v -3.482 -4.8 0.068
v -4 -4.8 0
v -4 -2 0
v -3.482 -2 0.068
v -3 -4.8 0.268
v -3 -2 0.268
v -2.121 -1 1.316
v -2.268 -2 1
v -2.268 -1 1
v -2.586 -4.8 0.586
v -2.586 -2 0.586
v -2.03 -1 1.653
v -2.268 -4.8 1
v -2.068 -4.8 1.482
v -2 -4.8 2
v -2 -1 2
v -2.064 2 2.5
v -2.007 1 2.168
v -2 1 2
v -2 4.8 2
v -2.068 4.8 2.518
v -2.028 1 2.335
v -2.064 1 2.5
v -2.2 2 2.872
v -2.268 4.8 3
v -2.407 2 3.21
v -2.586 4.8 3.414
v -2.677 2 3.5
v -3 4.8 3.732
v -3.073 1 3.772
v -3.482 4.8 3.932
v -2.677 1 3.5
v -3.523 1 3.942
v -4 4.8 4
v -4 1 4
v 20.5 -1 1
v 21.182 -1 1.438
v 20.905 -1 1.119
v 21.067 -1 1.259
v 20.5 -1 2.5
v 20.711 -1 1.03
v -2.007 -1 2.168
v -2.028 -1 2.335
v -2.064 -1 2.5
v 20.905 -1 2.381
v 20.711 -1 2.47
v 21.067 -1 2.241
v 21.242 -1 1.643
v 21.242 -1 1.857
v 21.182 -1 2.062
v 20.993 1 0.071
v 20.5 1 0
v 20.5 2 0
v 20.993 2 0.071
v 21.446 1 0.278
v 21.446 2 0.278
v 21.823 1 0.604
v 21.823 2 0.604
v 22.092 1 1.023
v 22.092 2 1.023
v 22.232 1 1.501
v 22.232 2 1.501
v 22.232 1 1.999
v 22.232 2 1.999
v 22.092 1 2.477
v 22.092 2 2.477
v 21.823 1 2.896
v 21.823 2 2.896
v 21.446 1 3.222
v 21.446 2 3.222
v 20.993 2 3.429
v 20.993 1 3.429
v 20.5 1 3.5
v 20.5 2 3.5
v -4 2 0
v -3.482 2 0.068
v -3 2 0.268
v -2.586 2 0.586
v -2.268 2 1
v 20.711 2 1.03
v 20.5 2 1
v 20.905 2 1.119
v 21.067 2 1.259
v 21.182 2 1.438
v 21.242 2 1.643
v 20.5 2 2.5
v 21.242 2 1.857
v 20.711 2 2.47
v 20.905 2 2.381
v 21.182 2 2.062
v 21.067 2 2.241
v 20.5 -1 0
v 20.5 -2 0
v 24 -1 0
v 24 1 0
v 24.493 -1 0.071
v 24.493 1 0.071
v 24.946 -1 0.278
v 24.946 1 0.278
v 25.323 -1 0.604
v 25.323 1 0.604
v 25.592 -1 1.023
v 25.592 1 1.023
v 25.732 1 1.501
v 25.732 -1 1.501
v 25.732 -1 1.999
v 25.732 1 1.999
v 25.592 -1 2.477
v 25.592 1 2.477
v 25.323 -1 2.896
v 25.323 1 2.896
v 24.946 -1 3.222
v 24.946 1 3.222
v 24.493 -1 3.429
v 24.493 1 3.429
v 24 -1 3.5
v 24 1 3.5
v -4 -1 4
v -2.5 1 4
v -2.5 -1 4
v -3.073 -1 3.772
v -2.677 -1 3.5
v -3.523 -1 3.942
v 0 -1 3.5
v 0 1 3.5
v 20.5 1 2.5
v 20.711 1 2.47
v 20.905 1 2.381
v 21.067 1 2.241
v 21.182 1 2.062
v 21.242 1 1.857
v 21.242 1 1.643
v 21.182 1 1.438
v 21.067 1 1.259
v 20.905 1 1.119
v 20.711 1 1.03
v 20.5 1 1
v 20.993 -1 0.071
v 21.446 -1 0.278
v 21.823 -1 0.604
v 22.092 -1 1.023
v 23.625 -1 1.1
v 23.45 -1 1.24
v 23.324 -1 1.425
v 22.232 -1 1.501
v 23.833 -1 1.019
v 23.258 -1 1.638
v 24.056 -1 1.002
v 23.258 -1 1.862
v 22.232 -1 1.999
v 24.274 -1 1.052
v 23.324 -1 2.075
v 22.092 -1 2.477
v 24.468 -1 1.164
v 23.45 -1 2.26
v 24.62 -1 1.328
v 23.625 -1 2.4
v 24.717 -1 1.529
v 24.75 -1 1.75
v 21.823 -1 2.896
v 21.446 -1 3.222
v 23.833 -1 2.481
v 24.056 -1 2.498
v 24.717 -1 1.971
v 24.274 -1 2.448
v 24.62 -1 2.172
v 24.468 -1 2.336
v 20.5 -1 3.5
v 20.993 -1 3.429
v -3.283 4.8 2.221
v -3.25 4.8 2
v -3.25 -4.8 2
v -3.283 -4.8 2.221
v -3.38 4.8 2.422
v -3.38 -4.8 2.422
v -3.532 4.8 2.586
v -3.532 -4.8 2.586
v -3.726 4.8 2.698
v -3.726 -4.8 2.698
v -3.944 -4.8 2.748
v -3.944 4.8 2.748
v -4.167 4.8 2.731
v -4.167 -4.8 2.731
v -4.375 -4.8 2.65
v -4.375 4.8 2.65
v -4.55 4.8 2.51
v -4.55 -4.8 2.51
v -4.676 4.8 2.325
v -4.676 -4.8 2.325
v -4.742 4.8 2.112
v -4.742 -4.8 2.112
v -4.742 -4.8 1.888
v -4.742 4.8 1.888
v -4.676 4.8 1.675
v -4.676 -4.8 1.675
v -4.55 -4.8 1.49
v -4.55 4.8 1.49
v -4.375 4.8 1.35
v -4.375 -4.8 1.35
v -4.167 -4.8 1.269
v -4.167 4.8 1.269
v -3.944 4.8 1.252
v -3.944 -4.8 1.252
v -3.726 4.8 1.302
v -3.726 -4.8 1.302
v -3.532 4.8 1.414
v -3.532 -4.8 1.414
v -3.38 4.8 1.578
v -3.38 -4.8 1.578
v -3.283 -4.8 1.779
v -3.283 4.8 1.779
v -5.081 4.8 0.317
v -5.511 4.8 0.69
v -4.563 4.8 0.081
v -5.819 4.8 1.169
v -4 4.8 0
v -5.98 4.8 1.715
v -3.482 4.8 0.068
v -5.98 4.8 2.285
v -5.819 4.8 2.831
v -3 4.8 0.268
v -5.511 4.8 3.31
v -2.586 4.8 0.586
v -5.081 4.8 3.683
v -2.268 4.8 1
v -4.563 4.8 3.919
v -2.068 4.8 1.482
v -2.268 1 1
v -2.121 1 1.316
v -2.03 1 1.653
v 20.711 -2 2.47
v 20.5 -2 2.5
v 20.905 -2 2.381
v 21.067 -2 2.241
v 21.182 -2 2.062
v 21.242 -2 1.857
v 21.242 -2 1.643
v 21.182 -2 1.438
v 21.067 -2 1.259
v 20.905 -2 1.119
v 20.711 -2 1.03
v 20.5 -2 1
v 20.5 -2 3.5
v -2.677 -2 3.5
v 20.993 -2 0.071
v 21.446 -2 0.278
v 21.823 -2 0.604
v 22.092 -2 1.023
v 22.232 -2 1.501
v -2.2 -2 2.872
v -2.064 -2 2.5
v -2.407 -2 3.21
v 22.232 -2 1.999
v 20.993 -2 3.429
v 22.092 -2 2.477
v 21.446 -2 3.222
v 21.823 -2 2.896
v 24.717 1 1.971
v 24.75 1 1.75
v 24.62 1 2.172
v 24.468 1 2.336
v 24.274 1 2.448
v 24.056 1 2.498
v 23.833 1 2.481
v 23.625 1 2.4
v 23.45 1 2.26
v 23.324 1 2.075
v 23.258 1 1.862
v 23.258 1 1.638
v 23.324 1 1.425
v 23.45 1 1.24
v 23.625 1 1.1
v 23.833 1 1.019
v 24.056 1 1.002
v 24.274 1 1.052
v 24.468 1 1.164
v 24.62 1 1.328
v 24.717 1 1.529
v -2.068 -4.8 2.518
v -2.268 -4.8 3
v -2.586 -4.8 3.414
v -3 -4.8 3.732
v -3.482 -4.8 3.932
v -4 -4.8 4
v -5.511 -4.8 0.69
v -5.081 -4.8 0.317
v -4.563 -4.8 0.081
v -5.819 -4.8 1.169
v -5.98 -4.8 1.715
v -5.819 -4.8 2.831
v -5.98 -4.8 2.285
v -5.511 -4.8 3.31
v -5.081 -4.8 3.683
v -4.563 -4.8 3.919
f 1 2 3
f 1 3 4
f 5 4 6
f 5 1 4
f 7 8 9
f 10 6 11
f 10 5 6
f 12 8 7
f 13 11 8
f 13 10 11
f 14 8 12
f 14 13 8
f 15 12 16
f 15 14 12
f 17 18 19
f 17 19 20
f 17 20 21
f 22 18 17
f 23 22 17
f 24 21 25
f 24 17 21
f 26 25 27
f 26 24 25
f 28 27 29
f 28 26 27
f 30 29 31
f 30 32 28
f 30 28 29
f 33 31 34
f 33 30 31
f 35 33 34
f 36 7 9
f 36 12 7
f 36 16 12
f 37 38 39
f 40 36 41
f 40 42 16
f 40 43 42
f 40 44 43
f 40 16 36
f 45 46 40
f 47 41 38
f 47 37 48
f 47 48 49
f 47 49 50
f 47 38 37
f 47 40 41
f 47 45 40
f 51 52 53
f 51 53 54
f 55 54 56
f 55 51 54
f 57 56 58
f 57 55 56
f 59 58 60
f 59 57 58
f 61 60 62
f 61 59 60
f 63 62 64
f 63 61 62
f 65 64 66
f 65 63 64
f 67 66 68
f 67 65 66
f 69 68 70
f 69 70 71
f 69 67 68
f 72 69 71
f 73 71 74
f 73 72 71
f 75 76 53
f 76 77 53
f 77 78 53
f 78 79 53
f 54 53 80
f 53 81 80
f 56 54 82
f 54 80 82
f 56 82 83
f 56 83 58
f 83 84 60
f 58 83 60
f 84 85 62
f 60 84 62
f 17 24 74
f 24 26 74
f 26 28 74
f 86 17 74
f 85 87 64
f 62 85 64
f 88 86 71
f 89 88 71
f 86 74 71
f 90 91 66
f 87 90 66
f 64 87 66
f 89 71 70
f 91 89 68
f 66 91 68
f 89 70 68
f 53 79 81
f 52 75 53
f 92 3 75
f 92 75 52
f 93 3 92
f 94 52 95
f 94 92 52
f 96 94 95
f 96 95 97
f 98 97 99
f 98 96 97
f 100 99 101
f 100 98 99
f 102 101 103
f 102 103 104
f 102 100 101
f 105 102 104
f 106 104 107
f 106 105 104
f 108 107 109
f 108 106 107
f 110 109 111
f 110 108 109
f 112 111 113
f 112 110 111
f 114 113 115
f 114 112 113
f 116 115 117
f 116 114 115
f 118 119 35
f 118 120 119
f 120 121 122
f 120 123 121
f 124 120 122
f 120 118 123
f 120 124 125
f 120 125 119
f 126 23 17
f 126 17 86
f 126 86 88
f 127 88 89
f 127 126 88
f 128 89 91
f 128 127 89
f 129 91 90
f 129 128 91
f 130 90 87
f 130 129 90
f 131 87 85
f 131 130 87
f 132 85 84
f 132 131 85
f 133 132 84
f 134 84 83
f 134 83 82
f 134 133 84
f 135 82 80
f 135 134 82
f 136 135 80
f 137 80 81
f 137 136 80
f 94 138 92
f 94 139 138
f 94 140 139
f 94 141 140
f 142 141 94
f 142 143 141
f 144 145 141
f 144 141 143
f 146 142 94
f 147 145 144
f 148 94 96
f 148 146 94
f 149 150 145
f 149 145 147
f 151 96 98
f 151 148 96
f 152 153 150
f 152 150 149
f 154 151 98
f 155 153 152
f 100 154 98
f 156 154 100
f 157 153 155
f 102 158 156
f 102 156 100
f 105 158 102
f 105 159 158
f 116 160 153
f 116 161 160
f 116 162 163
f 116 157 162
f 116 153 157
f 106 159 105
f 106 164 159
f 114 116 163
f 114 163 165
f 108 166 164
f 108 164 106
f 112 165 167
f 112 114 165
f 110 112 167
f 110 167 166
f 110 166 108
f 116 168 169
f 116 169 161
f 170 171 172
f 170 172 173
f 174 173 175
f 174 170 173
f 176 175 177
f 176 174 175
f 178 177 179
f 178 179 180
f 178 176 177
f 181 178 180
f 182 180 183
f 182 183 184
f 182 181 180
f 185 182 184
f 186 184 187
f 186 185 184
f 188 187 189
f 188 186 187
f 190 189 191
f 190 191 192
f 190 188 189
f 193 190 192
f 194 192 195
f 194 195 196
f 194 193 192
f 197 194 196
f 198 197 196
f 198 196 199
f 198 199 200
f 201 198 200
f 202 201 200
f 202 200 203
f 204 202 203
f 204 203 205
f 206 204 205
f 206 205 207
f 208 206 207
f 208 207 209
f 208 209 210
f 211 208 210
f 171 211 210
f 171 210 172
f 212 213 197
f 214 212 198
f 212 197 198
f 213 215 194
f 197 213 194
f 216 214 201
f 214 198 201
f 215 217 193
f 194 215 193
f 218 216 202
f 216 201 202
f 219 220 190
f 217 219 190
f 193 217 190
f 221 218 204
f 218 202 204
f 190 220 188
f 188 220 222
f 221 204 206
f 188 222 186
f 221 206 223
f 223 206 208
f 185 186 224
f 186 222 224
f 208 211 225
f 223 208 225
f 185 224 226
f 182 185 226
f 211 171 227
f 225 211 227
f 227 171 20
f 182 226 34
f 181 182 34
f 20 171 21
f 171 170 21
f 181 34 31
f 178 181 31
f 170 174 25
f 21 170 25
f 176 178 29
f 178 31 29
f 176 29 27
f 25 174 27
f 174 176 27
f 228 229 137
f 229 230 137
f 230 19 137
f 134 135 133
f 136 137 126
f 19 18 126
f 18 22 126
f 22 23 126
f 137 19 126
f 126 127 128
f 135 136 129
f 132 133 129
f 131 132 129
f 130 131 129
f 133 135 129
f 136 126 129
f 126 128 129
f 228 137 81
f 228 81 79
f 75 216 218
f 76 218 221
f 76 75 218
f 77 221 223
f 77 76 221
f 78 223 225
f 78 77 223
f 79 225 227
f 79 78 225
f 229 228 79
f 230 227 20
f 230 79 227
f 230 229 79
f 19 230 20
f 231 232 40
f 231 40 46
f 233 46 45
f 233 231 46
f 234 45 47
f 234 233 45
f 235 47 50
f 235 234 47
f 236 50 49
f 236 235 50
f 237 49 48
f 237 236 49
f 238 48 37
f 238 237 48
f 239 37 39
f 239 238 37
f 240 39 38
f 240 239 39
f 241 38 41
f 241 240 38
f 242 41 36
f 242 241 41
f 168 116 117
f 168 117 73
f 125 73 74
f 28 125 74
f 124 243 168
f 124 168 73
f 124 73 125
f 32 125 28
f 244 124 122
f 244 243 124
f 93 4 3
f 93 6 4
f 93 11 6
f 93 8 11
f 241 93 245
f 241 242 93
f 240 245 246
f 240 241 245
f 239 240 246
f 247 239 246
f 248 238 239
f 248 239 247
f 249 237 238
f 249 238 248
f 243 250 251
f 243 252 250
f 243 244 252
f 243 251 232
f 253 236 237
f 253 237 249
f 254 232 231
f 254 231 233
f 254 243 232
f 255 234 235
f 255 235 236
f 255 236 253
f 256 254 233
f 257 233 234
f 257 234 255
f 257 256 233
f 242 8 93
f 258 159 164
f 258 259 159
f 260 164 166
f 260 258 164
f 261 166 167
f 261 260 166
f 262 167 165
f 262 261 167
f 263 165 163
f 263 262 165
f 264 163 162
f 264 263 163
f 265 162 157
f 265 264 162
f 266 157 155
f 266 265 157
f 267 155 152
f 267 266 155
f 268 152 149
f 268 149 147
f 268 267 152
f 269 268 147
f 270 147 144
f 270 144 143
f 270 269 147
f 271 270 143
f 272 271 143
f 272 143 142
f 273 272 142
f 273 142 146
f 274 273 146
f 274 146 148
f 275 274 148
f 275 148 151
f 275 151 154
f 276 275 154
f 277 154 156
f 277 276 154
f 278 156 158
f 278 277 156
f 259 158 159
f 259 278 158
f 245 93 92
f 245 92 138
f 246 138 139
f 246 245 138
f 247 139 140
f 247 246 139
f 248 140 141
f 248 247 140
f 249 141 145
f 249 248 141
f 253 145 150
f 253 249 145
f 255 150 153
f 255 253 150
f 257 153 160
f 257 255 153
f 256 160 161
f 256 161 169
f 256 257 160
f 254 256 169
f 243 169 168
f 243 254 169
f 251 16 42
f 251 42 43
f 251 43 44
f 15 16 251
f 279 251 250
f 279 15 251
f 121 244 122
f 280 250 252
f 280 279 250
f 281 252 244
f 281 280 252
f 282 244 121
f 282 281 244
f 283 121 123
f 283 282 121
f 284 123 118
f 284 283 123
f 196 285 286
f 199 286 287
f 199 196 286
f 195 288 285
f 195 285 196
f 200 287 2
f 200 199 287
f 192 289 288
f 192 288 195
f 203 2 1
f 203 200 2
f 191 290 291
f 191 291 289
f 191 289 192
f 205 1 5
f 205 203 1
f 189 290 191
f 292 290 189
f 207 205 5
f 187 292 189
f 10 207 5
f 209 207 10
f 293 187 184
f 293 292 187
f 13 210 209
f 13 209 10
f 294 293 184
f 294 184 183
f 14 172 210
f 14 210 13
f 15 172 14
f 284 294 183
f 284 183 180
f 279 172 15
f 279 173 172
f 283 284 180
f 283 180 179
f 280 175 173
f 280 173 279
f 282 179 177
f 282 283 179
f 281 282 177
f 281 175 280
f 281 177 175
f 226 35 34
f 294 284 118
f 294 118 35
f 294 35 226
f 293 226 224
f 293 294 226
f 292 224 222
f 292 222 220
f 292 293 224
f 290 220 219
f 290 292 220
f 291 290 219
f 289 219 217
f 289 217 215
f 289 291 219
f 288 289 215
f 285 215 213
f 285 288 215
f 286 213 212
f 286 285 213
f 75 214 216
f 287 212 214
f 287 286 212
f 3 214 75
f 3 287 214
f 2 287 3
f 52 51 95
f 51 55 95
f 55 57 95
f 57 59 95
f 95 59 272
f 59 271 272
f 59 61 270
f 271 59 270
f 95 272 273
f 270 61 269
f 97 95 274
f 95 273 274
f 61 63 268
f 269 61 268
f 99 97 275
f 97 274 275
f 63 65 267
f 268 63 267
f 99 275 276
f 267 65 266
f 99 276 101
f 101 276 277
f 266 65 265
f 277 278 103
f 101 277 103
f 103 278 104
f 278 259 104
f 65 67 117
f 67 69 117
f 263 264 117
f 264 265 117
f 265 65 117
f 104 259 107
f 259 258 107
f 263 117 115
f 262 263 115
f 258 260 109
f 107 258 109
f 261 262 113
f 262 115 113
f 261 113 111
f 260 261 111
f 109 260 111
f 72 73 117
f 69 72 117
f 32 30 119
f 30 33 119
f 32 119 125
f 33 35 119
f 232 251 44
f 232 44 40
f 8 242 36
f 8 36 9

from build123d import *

# Parameters (mm, degrees)
F0_R     = 0.75
F1_DEPTH = 1
F2_DEPTH = 4.8
F4_DEPTH = 2


with BuildPart() as f1:
    # F0 (on Front) → F1 (new body, symmetric)
    with BuildSketch(Plane.XZ):
        with BuildLine():
            Line((-4, 0), (0, 0))
            Line((0, 0), (24, 0))
            ThreePointArc((24, 0), (25.75, 1.75), (24, 3.5))
            Line((24, 3.5), (0, 3.5))
            Line((0, 3.5), (-2.5, 4))
            Line((-2.5, 4), (-4, 4))
            ThreePointArc((-4, 4), (-2.585786, 3.414214), (-2, 2))
            ThreePointArc((-2, 2), (-2.585786, 0.585786), (-4, 0))
        make_face()
        with Locations((24, 1.75)):
            Circle(F0_R, mode=Mode.SUBTRACT)
        with BuildLine():
            ThreePointArc((-4, 4), (-6, 2), (-4, 0))
            ThreePointArc((-4, 0), (-2.585786, 0.585786), (-2, 2))
            ThreePointArc((-2, 2), (-2.585786, 3.414214), (-4, 4))
        make_face()
        with Locations((-4, 2)):
            Circle(F0_R, mode=Mode.SUBTRACT)
    extrude(amount=F1_DEPTH, both=True)

    # F0 (on Front) → F2 (join, symmetric)
    with BuildSketch(Plane.XZ):
        with BuildLine():
            ThreePointArc((-4, 4), (-6, 2), (-4, 0))
            ThreePointArc((-4, 0), (-2.585786, 0.585786), (-2, 2))
            ThreePointArc((-2, 2), (-2.585786, 3.414214), (-4, 4))
        make_face()
        with Locations((-4, 2)):
            Circle(F0_R, mode=Mode.SUBTRACT)
    extrude(amount=F2_DEPTH, both=True)

    # F3 (on Front) → F4 (join, symmetric)
    with BuildSketch(Plane.XZ):
        with BuildLine():
            Line((20.5, 3.5), (0, 3.5))
            Line((0, 3.5), (-3.022093, 3.5))
            Line((-3.022093, 3.5), (-3.022093, 2.5))
            Line((-3.022093, 2.5), (0, 2.5))
            Line((0, 2.5), (20.5, 2.5))
            ThreePointArc((20.5, 2.5), (21.25, 1.75), (20.5, 1))
            Line((20.5, 1), (-4, 1))
            Line((-4, 1), (-4, 0))
            Line((-4, 0), (20.5, 0))
            ThreePointArc((20.5, 0), (22.25, 1.75), (20.5, 3.5))
        make_face()
    extrude(amount=F4_DEPTH, both=True)


solid = f1.part
